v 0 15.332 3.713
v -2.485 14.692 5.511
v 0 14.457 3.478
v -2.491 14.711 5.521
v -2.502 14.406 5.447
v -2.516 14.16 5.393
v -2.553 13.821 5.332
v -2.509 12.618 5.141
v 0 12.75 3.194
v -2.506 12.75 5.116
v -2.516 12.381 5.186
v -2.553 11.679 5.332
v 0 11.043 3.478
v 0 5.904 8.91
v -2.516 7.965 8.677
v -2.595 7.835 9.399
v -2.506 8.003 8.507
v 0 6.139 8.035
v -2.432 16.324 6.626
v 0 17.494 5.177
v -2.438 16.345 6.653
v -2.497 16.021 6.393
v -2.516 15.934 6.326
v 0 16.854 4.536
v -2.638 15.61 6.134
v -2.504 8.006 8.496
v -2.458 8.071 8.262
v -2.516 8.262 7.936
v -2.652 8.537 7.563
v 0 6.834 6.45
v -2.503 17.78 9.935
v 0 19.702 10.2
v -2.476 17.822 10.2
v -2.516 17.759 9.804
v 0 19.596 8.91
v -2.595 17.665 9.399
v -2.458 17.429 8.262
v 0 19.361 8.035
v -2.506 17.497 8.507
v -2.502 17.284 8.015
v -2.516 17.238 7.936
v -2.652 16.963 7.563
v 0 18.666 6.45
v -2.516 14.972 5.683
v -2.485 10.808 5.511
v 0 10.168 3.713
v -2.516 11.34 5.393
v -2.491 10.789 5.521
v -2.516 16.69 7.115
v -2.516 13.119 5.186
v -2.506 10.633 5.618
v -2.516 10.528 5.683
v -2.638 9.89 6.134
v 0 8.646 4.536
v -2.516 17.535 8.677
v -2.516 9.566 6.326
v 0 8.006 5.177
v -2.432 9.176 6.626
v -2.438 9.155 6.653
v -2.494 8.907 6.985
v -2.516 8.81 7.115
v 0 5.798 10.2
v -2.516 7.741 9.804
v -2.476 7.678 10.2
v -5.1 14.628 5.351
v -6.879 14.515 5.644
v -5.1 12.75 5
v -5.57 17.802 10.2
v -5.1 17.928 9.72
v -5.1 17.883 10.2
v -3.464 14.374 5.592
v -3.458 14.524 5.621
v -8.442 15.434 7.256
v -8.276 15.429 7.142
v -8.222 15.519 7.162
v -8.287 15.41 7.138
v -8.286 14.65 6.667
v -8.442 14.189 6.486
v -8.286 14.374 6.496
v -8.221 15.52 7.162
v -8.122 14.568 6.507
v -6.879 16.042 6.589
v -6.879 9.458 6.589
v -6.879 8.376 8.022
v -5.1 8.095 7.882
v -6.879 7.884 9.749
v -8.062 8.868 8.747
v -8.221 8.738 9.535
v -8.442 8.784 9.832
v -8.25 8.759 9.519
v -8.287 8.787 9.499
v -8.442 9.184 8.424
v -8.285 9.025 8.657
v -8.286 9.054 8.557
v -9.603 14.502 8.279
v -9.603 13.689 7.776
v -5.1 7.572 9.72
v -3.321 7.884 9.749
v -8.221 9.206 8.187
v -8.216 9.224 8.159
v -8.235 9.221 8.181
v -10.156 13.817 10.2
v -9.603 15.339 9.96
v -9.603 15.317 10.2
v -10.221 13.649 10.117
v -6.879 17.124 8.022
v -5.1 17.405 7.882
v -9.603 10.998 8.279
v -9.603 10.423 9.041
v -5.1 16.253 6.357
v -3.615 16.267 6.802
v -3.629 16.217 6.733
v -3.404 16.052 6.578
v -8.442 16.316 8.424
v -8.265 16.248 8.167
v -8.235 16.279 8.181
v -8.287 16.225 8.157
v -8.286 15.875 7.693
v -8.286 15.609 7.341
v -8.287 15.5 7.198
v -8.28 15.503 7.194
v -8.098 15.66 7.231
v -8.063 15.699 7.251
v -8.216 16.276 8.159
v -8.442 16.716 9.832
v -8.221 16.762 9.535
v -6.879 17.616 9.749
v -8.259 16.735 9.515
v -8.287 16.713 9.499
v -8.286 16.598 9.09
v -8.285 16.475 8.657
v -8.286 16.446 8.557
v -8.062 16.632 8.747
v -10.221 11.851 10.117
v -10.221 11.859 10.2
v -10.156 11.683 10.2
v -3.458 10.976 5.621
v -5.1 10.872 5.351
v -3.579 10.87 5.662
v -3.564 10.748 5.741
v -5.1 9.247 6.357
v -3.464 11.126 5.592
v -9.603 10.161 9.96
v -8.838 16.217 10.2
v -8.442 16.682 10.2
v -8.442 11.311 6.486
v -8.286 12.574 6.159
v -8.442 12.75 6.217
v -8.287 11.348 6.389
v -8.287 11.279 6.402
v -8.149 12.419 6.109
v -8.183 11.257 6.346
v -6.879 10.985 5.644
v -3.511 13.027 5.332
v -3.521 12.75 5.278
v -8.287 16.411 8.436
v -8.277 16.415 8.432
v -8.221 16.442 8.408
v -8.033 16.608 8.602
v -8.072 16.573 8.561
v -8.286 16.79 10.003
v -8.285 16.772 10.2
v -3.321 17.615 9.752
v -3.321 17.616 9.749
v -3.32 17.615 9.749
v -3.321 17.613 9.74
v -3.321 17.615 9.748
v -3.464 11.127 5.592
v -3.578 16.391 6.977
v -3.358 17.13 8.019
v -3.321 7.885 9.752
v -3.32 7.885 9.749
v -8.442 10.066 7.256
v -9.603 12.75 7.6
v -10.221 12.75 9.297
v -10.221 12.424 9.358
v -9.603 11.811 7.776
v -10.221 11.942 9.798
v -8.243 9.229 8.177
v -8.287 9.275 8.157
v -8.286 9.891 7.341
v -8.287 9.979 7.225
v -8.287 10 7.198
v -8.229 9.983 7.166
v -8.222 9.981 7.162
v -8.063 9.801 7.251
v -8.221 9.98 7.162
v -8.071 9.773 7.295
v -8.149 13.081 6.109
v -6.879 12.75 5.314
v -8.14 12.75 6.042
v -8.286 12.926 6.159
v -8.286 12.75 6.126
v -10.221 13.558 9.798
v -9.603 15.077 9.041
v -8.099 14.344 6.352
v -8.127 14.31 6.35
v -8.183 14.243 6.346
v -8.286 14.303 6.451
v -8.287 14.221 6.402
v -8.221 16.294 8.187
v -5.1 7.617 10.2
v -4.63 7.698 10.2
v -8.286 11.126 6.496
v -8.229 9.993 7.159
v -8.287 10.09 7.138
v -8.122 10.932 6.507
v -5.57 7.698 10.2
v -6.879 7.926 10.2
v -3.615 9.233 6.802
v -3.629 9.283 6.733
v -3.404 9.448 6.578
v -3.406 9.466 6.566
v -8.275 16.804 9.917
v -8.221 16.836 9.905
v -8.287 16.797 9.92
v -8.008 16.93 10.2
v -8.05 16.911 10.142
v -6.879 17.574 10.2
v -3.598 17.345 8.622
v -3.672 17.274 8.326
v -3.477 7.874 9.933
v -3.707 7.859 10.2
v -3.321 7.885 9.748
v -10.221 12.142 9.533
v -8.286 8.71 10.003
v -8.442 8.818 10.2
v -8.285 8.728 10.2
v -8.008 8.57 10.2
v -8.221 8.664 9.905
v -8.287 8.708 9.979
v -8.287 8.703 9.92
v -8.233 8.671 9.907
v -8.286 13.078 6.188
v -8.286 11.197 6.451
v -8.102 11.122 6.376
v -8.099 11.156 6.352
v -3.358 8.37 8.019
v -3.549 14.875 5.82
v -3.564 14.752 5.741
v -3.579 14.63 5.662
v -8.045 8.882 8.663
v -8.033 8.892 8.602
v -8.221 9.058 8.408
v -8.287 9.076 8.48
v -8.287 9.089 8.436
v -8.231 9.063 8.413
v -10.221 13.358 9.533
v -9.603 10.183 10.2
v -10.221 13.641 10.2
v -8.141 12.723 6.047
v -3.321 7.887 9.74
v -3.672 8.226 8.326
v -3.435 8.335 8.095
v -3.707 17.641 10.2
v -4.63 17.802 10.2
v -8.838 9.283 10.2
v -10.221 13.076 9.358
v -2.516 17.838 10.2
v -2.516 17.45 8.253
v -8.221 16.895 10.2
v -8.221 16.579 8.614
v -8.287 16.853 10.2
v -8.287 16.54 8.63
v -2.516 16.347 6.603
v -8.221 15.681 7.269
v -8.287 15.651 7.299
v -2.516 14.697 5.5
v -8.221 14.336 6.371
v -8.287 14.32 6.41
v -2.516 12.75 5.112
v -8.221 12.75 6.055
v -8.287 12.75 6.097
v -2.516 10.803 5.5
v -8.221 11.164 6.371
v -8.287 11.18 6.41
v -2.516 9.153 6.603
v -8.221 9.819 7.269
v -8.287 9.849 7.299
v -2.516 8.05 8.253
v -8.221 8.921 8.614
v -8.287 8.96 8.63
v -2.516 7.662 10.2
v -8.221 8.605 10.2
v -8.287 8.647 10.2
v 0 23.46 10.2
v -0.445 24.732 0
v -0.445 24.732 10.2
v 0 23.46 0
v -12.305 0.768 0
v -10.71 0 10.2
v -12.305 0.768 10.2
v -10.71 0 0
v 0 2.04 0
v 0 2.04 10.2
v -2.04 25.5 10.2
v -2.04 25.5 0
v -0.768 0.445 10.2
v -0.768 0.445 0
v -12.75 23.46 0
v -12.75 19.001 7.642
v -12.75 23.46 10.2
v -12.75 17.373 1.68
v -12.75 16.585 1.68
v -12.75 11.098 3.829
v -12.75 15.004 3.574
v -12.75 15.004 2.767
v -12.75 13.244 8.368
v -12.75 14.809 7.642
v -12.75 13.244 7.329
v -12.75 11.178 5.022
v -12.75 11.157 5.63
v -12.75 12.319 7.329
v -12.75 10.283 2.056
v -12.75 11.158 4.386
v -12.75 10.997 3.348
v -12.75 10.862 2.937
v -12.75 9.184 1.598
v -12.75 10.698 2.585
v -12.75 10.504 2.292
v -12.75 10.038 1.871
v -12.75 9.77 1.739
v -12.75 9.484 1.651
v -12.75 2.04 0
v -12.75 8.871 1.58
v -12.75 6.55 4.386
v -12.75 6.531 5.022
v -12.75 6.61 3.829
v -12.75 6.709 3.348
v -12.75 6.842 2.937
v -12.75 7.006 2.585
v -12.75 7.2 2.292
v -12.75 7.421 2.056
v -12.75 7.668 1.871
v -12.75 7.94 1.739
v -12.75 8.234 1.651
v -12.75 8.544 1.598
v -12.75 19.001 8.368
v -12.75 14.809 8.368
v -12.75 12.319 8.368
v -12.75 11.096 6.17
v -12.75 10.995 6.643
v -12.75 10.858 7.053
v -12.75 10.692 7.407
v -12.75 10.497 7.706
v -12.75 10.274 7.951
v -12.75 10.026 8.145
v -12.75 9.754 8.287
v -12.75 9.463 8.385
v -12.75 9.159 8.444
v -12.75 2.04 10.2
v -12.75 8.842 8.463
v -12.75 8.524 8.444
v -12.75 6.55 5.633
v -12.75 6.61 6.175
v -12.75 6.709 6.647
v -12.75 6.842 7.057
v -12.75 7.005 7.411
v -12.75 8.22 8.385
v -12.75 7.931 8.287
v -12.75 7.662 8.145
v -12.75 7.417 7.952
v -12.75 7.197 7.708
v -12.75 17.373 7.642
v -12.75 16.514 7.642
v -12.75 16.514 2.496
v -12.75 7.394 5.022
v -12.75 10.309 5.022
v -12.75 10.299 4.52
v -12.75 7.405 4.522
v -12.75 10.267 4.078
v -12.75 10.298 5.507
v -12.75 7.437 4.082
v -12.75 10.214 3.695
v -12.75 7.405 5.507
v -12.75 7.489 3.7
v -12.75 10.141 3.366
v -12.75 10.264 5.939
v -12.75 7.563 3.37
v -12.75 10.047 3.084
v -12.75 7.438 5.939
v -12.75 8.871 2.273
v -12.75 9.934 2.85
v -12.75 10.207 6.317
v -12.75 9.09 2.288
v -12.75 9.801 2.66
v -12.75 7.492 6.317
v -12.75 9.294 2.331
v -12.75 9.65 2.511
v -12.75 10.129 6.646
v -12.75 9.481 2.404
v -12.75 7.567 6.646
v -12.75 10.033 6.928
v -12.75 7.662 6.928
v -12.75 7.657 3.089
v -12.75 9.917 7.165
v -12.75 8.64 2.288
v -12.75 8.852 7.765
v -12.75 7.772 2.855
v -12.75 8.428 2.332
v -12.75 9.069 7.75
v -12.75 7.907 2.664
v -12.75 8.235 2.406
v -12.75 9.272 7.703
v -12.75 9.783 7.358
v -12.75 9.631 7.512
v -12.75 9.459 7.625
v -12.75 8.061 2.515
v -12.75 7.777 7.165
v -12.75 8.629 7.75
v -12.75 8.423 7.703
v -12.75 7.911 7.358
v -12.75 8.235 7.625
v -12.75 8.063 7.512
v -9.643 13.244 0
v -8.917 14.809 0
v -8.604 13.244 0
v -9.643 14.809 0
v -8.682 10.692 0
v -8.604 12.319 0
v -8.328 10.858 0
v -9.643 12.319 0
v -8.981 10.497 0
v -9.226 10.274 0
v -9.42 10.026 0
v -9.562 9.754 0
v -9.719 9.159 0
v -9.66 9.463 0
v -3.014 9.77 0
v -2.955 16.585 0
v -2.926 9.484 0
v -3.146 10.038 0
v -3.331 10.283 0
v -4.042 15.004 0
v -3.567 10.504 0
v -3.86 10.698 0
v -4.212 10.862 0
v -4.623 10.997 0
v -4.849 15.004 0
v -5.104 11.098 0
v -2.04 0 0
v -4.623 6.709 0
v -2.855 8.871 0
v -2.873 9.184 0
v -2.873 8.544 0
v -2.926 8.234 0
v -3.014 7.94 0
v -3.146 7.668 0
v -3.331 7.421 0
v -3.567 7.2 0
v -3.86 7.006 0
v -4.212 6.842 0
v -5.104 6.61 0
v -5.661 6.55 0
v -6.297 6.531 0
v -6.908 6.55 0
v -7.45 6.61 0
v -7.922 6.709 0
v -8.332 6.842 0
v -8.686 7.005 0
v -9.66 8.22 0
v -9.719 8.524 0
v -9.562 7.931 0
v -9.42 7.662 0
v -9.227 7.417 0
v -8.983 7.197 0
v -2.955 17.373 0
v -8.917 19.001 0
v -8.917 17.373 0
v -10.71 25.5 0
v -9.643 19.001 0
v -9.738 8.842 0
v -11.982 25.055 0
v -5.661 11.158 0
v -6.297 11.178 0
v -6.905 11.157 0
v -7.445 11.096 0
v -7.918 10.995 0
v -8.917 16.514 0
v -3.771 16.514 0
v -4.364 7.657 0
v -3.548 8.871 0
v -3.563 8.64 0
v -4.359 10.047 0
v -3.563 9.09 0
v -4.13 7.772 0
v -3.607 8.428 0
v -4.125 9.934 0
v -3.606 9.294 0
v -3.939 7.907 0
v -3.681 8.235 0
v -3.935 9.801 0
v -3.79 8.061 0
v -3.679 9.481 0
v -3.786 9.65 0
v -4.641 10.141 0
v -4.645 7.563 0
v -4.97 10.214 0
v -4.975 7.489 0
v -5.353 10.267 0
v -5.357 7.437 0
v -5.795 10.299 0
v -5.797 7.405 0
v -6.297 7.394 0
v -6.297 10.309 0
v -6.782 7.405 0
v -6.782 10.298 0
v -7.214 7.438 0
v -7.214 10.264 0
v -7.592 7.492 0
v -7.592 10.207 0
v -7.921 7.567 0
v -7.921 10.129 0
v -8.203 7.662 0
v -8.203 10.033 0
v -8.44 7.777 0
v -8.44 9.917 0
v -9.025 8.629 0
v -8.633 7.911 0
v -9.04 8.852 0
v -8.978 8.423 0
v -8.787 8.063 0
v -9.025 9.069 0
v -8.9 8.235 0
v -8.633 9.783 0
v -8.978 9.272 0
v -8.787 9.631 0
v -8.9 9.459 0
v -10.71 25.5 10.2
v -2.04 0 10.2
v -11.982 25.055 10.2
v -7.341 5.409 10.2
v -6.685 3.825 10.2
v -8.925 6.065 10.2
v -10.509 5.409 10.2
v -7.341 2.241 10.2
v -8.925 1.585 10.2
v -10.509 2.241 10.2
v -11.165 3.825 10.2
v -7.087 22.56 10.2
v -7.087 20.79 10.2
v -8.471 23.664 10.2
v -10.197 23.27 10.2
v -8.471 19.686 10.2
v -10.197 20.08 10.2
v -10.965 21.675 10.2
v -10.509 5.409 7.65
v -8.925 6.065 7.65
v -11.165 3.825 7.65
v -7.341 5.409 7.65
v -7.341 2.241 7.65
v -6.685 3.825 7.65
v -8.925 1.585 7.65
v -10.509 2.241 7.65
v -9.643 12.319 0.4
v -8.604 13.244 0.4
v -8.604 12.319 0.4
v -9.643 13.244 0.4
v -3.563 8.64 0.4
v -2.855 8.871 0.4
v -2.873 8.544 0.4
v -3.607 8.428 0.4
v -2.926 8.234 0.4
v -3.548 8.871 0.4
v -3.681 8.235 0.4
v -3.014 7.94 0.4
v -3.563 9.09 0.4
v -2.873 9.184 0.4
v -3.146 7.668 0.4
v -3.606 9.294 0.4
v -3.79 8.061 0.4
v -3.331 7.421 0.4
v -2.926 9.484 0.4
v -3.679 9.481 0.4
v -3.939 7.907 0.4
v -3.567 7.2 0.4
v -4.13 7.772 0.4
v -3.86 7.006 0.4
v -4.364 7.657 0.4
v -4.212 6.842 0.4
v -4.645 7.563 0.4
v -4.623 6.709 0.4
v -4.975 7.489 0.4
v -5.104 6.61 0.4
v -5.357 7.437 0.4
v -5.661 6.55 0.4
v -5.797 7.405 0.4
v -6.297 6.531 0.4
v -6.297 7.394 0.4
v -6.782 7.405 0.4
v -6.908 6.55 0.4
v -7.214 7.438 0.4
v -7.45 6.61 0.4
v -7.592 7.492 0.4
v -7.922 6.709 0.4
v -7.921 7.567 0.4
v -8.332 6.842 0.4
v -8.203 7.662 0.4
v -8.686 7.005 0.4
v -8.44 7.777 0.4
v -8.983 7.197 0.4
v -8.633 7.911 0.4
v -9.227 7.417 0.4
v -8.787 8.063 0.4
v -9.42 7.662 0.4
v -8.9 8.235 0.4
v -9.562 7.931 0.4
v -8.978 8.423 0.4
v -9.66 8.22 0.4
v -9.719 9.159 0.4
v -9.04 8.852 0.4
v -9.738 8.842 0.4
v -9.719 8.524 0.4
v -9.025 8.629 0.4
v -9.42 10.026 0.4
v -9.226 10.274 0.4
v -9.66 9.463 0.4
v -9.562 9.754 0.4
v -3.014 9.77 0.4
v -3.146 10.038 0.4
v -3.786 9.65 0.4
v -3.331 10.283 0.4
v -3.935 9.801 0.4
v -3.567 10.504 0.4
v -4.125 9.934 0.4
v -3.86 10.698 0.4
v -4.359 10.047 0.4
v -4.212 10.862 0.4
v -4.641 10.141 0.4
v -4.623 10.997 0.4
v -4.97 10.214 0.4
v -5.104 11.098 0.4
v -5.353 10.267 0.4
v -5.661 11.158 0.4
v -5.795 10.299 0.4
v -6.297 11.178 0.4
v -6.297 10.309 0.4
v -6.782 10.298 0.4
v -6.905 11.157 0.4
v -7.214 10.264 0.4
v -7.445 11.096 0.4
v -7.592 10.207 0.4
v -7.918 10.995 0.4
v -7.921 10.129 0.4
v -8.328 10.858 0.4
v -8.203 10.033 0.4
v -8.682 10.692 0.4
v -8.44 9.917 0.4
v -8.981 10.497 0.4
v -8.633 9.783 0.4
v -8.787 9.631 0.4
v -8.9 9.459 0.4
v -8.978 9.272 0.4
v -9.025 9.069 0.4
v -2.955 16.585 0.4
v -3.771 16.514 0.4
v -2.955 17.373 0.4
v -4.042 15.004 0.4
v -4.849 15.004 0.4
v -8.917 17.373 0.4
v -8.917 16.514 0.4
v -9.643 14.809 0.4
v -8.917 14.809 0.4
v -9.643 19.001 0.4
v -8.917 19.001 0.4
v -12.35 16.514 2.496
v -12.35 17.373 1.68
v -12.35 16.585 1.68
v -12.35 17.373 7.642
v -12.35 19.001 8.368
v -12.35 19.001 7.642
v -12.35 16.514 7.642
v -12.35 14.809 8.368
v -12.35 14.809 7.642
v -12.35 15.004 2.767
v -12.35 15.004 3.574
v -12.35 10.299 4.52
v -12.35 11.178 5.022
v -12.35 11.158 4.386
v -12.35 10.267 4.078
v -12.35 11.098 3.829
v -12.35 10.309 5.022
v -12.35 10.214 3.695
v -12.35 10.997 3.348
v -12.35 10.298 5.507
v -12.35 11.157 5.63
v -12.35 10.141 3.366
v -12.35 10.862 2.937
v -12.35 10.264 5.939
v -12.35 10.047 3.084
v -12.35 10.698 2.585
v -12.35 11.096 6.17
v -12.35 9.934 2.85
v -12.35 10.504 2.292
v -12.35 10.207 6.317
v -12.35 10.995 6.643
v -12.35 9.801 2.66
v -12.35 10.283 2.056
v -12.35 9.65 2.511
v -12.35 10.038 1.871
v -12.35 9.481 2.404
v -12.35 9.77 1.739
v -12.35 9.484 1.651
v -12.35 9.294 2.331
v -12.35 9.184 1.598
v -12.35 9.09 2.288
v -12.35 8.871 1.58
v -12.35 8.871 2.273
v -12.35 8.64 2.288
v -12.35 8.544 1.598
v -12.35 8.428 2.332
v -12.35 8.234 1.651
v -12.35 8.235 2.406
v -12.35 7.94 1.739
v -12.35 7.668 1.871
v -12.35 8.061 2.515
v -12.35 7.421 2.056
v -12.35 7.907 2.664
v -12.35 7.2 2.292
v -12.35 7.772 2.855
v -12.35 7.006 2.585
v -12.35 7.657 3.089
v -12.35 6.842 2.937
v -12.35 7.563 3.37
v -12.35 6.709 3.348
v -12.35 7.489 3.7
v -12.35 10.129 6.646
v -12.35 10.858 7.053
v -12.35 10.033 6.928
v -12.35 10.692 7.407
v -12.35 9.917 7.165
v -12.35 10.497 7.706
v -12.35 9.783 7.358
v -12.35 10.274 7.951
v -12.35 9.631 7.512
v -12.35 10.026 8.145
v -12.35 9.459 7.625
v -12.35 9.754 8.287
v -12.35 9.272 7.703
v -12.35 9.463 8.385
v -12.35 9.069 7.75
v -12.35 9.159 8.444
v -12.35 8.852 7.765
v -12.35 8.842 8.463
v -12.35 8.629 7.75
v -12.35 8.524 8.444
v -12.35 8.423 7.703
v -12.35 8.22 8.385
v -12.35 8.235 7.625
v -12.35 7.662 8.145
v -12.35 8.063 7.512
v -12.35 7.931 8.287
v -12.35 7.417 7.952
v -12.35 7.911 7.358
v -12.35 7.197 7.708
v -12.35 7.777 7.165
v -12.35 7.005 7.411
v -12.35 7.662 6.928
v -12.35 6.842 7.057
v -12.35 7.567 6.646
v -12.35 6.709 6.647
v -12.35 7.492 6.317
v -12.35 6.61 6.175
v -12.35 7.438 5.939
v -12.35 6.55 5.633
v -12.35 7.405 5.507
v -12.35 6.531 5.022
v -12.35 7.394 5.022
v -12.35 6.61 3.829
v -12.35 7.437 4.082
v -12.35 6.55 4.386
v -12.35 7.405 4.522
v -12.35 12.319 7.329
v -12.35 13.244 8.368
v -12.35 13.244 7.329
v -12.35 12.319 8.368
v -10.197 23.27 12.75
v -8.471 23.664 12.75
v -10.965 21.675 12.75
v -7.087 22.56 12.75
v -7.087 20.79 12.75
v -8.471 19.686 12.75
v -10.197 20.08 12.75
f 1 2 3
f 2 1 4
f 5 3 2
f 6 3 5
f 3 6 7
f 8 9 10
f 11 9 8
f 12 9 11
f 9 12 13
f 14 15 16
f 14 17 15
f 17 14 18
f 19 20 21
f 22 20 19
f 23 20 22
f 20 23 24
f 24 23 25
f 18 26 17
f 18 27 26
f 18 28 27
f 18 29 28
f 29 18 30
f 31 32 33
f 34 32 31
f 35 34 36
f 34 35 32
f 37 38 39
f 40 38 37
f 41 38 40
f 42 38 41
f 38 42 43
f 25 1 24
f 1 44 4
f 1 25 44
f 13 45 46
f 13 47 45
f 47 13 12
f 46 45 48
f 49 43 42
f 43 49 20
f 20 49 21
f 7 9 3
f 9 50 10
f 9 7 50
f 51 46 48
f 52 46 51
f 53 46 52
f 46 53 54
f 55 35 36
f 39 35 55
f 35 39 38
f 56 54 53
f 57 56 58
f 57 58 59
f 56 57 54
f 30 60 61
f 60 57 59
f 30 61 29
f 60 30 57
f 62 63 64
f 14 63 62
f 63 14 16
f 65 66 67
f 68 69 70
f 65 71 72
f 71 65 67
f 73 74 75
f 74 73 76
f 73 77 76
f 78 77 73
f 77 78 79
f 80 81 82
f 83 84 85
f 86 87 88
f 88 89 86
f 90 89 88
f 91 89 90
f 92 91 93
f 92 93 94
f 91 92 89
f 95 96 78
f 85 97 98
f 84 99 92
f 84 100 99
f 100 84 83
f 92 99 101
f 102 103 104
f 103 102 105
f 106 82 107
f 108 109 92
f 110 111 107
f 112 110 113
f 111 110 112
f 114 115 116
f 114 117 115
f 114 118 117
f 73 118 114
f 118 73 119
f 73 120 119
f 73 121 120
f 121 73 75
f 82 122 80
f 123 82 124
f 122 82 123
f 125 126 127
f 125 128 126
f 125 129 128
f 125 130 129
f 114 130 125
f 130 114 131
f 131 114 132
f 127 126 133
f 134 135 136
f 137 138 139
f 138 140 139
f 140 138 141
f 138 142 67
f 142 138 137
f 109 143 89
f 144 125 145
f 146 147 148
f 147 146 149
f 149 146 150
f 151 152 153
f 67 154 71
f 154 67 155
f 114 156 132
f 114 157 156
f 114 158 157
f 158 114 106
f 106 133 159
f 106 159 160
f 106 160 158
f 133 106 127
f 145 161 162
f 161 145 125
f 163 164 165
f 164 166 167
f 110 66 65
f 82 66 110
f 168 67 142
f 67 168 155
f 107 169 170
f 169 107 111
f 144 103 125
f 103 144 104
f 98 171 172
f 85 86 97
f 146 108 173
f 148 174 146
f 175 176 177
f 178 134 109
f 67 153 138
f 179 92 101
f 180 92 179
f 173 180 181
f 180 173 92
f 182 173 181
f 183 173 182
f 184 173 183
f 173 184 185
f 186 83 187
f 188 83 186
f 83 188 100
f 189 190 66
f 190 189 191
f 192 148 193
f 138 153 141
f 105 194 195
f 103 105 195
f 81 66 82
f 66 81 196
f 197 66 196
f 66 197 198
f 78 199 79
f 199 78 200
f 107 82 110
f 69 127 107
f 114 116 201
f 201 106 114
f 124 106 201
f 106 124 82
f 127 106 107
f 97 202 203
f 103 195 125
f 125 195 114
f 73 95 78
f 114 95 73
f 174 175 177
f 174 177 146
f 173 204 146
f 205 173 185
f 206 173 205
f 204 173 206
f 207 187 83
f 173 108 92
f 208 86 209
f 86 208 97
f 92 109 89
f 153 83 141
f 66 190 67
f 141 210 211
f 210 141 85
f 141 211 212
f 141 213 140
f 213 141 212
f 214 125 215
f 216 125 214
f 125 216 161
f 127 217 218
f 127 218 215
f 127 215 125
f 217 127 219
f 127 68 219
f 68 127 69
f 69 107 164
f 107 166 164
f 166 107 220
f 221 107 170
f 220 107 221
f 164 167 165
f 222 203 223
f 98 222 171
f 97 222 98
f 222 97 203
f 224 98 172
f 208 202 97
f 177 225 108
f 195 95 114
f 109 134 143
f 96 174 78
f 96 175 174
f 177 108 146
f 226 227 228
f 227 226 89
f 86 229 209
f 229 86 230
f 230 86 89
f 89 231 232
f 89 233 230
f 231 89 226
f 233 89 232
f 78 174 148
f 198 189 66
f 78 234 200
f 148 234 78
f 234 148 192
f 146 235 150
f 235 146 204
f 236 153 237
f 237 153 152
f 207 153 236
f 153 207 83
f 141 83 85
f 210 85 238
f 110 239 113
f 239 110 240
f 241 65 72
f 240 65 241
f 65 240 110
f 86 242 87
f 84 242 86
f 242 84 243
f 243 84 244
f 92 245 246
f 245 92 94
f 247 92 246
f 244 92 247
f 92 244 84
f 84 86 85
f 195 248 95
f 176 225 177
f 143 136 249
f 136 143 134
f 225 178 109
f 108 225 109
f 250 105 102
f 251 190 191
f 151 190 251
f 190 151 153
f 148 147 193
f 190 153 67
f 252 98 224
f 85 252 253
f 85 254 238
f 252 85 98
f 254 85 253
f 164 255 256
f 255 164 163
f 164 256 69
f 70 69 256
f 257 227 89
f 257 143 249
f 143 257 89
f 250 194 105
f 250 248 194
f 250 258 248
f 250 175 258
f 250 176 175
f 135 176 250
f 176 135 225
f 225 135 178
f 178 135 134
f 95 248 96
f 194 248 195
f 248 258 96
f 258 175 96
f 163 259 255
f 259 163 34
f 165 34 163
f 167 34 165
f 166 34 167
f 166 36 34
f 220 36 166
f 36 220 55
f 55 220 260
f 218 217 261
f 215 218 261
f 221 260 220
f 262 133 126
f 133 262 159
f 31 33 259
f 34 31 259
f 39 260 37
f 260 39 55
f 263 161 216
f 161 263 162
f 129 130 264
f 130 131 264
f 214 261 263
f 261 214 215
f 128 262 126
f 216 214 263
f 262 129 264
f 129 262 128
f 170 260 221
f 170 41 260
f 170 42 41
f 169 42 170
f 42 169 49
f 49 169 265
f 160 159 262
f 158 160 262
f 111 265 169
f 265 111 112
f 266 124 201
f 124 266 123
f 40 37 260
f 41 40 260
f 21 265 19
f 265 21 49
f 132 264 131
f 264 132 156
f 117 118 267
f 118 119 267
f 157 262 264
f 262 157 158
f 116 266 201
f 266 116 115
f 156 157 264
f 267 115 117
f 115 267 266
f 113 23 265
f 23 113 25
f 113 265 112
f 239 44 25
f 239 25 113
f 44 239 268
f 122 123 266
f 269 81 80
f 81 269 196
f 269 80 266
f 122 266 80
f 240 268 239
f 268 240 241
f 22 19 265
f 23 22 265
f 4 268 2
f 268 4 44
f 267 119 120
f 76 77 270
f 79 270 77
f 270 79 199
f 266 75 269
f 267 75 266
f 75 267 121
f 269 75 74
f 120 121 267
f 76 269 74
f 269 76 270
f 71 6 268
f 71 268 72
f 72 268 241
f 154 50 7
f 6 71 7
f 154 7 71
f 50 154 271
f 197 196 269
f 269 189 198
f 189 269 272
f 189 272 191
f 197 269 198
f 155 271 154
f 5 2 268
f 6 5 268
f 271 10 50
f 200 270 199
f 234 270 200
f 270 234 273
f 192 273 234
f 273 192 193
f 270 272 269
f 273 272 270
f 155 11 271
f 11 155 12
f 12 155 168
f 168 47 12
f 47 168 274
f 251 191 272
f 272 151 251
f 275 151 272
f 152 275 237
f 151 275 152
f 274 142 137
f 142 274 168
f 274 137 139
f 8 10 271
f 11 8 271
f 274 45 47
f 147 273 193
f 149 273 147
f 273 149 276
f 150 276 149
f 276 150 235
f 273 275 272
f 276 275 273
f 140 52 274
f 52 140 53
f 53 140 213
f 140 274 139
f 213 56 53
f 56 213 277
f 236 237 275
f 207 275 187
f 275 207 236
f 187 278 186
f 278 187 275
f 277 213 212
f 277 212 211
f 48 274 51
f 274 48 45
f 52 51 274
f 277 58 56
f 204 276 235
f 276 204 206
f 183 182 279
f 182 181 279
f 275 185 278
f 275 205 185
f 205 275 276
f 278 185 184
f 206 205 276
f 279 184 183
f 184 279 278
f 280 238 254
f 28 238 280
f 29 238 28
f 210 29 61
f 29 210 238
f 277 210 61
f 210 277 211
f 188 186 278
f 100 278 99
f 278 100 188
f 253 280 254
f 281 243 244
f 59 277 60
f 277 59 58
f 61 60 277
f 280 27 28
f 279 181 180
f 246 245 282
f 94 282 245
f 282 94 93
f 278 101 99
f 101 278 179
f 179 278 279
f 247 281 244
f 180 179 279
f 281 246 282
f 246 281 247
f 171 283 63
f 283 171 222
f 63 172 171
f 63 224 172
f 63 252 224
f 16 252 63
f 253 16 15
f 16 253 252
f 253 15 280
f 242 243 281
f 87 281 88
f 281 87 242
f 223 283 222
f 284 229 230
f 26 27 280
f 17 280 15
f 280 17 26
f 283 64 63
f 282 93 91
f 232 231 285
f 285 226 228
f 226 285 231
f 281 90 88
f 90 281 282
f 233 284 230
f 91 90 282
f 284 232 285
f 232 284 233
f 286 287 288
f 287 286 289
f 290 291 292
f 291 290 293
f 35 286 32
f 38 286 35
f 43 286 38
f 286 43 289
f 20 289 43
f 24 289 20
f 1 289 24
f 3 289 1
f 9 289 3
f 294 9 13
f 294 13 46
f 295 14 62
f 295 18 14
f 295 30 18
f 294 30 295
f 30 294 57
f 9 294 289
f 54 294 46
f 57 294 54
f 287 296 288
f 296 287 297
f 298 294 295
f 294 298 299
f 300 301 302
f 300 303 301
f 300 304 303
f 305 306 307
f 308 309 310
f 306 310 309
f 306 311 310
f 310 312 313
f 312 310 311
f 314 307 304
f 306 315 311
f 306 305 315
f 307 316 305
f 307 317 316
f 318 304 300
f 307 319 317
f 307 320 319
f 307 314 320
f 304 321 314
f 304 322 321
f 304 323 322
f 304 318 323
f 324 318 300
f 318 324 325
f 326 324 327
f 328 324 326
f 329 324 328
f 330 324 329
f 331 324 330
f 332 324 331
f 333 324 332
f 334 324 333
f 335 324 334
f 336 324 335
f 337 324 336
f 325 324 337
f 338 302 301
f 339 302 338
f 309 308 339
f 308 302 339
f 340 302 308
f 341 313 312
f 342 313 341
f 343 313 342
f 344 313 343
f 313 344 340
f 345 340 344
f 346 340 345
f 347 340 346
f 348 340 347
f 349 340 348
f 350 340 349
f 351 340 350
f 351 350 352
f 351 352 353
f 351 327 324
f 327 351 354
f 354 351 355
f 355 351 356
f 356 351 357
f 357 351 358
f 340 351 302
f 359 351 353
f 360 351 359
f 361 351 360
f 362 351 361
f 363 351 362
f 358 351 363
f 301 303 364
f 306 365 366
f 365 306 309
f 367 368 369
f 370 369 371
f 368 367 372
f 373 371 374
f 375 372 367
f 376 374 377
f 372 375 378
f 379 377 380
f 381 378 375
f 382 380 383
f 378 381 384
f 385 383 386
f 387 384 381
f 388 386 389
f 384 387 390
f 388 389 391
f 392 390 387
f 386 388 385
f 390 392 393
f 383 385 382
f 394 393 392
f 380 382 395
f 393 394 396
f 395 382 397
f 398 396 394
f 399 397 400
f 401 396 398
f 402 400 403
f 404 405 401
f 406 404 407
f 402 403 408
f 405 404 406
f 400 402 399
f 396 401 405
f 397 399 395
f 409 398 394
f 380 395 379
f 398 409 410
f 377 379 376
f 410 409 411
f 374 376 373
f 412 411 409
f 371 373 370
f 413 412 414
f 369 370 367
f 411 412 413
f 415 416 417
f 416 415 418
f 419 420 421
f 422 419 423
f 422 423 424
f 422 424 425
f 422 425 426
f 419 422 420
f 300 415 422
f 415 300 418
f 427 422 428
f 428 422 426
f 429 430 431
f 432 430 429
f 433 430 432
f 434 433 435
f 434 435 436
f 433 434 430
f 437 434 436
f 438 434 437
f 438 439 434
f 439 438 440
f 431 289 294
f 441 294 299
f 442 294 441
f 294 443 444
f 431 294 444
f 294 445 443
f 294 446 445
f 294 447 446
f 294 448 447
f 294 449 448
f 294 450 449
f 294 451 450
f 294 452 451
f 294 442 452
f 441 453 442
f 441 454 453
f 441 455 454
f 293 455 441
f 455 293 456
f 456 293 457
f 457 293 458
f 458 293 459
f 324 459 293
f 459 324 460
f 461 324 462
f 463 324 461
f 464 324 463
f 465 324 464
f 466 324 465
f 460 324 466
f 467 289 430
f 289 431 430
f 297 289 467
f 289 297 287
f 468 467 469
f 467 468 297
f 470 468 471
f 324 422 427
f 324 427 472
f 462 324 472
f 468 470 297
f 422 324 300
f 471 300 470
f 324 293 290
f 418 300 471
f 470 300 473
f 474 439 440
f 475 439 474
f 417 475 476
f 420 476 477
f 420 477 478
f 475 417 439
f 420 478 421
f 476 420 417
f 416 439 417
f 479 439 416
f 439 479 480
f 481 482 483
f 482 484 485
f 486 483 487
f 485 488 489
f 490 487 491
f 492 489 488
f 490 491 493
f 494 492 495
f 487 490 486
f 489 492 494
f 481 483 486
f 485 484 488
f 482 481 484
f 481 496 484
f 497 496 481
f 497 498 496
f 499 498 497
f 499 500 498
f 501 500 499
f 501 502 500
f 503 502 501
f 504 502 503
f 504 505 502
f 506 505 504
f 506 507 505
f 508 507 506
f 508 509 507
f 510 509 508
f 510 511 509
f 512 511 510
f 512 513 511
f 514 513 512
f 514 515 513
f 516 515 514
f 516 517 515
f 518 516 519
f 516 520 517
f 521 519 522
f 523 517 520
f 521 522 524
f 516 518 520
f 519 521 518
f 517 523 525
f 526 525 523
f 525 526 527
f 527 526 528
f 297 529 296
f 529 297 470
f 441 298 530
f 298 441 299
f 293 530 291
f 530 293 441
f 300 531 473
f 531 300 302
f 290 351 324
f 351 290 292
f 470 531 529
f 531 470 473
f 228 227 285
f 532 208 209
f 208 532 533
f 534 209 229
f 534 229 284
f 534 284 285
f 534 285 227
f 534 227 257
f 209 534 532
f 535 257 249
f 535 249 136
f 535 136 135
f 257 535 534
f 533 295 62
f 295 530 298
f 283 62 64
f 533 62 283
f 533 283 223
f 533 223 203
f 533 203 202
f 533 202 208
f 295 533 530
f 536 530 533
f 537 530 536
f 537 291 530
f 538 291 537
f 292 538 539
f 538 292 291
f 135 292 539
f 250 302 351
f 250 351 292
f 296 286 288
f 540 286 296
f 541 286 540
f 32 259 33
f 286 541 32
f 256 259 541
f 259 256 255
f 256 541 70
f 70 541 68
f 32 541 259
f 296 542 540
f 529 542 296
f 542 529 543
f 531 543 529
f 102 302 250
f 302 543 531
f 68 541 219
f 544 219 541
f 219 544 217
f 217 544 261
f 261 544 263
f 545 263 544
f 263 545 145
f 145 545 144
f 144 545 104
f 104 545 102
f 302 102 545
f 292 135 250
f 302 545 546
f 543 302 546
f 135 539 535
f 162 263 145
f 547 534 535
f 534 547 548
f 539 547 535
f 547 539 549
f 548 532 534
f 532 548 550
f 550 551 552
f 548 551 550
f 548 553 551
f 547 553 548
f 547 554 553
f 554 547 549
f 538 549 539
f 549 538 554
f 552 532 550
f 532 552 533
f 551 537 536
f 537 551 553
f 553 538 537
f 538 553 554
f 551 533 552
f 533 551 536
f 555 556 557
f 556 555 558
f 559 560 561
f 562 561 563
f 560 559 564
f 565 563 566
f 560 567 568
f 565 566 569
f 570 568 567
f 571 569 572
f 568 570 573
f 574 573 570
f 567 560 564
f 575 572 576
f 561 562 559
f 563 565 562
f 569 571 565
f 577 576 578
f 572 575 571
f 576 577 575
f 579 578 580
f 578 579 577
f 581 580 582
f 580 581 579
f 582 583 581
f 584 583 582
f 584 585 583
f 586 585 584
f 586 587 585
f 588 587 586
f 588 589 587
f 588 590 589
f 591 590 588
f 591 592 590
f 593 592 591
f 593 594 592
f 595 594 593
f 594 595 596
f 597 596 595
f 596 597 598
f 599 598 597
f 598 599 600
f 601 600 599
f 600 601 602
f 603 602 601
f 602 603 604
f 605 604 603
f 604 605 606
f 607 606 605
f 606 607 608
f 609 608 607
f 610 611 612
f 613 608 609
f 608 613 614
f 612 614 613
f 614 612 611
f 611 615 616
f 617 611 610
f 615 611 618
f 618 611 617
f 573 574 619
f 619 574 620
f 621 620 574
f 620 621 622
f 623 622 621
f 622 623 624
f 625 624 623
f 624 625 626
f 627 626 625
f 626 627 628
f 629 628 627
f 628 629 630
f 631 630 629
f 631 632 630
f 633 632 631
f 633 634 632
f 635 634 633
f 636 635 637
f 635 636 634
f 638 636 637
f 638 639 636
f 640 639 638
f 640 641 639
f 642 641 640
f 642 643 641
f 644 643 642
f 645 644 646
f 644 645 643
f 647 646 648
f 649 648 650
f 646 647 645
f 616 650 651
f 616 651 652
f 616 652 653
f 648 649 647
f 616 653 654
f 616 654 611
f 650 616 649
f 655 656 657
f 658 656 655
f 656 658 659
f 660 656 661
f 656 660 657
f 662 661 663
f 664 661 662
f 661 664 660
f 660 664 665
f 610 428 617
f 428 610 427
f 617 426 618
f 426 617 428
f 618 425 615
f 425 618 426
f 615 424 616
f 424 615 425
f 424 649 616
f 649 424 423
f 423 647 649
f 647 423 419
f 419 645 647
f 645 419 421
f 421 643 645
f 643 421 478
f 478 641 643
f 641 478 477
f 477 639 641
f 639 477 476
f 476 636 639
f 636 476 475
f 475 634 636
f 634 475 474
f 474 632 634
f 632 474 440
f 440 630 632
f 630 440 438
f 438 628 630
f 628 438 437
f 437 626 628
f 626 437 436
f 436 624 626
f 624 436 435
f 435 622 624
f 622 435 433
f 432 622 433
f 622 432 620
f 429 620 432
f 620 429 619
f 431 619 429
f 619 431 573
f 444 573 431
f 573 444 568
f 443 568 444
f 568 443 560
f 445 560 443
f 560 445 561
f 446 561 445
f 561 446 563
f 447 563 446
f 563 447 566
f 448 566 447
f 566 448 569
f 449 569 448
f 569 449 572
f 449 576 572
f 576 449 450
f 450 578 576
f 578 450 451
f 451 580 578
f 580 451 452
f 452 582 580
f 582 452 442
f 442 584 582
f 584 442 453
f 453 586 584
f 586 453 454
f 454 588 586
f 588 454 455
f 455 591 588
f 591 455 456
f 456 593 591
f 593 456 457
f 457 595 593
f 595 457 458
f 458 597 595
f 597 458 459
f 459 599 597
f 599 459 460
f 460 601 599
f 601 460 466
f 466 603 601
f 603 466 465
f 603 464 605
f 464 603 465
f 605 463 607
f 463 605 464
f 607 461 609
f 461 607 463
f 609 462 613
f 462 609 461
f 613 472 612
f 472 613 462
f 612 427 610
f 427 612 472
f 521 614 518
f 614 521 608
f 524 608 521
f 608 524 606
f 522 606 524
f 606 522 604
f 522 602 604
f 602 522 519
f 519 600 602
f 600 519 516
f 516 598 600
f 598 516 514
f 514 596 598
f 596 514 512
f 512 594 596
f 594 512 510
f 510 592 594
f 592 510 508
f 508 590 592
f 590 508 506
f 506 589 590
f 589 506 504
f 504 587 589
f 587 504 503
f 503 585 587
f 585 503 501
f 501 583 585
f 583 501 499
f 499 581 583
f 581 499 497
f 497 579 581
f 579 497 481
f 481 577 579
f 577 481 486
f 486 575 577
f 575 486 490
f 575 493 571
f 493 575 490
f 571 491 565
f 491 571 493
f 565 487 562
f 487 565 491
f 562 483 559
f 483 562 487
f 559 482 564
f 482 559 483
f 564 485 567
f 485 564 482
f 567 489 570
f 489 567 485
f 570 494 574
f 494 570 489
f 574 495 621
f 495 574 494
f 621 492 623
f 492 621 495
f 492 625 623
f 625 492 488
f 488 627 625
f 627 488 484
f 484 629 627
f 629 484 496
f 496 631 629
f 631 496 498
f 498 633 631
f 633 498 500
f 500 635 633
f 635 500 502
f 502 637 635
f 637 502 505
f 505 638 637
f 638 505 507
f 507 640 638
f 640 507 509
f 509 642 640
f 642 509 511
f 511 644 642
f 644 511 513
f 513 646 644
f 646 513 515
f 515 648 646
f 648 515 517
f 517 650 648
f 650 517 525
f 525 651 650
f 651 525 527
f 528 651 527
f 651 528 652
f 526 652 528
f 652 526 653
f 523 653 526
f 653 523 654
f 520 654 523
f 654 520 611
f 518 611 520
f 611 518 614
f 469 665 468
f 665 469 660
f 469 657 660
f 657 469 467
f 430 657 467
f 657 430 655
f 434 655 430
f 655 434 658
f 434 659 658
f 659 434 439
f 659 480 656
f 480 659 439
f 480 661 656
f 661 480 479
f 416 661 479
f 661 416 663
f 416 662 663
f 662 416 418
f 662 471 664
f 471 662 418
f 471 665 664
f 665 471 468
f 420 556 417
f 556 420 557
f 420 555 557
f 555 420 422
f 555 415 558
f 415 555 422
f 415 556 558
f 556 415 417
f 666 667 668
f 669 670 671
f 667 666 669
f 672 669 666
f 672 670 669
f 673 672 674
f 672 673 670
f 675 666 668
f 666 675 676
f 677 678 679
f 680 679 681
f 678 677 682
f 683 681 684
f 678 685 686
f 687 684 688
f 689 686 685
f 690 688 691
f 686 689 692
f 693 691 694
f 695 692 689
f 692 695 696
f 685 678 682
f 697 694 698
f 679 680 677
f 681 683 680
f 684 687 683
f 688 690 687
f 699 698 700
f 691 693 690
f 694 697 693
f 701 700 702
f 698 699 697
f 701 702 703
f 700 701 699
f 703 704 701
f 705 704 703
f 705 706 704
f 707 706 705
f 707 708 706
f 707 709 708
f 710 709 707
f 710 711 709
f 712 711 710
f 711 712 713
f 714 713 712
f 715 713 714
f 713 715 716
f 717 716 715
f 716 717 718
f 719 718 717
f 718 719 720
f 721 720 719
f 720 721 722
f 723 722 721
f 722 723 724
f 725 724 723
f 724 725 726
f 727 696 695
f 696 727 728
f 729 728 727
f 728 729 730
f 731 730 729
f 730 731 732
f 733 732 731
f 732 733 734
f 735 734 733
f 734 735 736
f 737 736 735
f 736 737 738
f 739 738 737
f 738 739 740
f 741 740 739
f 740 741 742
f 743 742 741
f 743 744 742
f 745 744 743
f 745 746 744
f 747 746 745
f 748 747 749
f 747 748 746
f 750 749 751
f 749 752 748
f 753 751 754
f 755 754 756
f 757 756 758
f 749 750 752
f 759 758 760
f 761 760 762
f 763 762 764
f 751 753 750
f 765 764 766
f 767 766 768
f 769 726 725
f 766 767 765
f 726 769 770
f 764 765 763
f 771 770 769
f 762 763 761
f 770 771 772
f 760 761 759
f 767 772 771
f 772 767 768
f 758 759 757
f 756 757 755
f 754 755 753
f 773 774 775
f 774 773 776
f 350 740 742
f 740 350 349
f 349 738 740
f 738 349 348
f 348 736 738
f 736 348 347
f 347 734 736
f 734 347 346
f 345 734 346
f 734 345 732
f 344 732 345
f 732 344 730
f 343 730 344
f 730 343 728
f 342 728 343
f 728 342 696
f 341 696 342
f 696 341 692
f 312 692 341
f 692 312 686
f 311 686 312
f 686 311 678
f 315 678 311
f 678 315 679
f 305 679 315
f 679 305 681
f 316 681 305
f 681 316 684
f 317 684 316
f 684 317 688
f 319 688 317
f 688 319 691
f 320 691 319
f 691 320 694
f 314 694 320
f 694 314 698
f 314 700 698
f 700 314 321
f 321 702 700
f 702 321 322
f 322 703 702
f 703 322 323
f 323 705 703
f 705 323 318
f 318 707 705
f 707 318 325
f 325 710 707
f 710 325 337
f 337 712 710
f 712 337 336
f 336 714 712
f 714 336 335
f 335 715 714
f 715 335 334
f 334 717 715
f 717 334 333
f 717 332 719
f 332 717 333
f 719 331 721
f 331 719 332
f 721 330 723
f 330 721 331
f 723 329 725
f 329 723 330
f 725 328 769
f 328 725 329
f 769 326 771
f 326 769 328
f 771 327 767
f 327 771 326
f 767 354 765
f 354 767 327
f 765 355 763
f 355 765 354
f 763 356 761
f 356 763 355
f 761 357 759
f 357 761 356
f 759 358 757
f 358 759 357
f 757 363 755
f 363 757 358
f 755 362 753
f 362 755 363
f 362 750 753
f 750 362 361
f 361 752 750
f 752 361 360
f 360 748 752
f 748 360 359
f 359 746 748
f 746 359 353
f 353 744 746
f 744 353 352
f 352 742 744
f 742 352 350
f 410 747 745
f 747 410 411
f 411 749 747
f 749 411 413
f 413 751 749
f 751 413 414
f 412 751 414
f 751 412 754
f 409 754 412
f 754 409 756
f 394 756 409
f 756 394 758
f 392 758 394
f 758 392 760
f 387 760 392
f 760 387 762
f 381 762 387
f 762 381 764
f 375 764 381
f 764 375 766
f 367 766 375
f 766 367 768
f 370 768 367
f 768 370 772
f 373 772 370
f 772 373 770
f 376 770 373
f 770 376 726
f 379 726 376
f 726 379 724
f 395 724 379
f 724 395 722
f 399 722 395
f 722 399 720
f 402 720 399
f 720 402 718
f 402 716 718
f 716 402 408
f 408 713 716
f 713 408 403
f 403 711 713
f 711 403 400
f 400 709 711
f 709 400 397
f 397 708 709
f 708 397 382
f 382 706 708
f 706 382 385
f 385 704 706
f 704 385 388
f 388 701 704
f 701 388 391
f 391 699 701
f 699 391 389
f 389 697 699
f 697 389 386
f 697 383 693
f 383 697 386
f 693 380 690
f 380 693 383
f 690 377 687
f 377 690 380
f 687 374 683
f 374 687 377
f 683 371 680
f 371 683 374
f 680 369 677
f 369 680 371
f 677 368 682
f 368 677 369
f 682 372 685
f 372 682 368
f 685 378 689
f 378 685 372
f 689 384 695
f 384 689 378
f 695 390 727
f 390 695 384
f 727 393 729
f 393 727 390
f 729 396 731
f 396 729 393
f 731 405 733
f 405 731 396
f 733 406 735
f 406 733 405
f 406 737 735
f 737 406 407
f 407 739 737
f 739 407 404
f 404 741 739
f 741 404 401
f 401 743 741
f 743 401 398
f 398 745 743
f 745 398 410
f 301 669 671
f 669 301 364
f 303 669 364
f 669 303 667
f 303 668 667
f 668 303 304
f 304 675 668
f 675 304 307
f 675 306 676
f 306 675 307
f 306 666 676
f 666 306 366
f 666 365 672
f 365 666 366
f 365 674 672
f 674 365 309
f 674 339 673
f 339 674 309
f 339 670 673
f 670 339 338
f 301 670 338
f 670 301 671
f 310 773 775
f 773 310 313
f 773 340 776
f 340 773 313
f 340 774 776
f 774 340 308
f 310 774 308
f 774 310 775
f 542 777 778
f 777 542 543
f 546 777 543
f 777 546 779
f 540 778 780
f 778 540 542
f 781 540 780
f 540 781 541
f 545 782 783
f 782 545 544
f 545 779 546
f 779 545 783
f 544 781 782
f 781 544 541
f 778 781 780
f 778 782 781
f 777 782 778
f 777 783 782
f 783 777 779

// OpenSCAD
// Two-part ball joint mechanism (head and socket).

include <../shared/common.scad>

module ball_head(ball_d, rod_d, rod_l) {
    sphere(d=ball_d);
    cylinder(d=rod_d, h=rod_l + ball_d/2);
    // cone for added robustness
    cylinder(d1=ball_d, d2=rod_d, h=ball_d/2);

    // position children at the tip of the rod
    translate([0, 0, rod_l + ball_d/2]) {
        children();
    }
}

// socket shape that is meant to be subtracted from other shapes
module ball_socket(ball_d, rod_d, rod_l, opening_angle=90, clearance=clearance_medium) {
    cone_d2 = 2 * rod_l * sin(opening_angle/2);
    cone_h = rod_l * cos(opening_angle/2);
    minkowski() {
        cylinder(d1=0, d2=cone_d2, h=cone_h);
        sphere(r=rod_d/2 + clearance, $fn=12);
    }
    sphere(d=ball_d + 2 * clearance);

    // cone for added robustness
    rotate_extrude() {
        intersection() {
            hull() {
                offset(r=clearance) {
                    rotate([0, 0, -opening_angle/2]) {
                        polygon([[0, 0], [ball_d/2, 0], [rod_d/2, ball_d/2], [0, ball_d/2]]);
                    }
                }
                square([min_value, rod_l]);
            }
            // restrict to 2D content in +x quadrant, to make rotate_extrude
            // work for clearance>0
            translate([0, -max_value/2]) {
                square(max_value);
            }
        }
    }
}

// Test object for dialling in socket tolerances.
module __ball_joint_socket_test_object(ball_d, rod_d, rod_l, opening_angle=90, clearance=clearance_medium) {
    // cube-shaped overall, with this edge length
    object_x = ball_d * 1.25;
    object_y = ball_d * 2.5;
    object_z = ball_d * 2;
    round_r = ball_d / 5;
    text_depth = 0.4;

    module label() {
        linear_extrude(height=text_depth+dif) {
            text(str(clearance), size=7, halign="center", valign="center");
        }
    }

    module whole() {
        difference() {
            translate([0, 0, -object_z/2]) {
                linear_extrude(object_z) {
                    translate([round_r, round_r]) {
                        offset(r=round_r) {
                            square([object_x, object_y] - 2*[round_r, round_r]);
                        }
                    }
                }
            }

            translate([ball_d/2, object_y/2, 0]) {
                rotate([0, -90, 0]) {
                    ball_socket(ball_d=ball_d,
                                rod_d=rod_d,
                                rod_l=rod_l,
                                opening_angle=opening_angle,
                                clearance=clearance);
                }
            }
        }
    }

    module half() {
        alignment_pin_r = ball_d/5;
        alignment_pin_z = object_z/8;

        difference() {
            intersection() {
                whole();
                cube([object_x, object_y, object_z/2]);
            }
            // alignment cavity
            translate([0.7 * object_x, 0.15*object_y, -dif]) {
                cylinder(r=alignment_pin_r + clearance_medium, h=alignment_pin_z + dif);
            }

            // labels with the clearance chosen
            translate([object_x/2, object_y/2, object_z/2 - text_depth]) {
                rotate([0, 0, 90]) {
                    label();
                }
            }
            translate([object_x - text_depth, object_y/2, object_z/4]) {
                rotate([90, 0, 90]) {
                    label();
                }
            }
        }
        // alignment pin
        translate([0.7 * object_x, 0.85*object_y, -alignment_pin_z]) {
            cylinder(r=alignment_pin_r, h=alignment_pin_z);
        }
    }

    translate([0, 0, object_z/2]) {
        rotate([0, 180, 0]) {
            half();
        }
    }
}

__ball_joint_socket_test_object(
    ball_d=10.2,
    rod_d=4.75,
    rod_l=2*4.75,
    opening_angle=75,
    clearance=0.1
);
